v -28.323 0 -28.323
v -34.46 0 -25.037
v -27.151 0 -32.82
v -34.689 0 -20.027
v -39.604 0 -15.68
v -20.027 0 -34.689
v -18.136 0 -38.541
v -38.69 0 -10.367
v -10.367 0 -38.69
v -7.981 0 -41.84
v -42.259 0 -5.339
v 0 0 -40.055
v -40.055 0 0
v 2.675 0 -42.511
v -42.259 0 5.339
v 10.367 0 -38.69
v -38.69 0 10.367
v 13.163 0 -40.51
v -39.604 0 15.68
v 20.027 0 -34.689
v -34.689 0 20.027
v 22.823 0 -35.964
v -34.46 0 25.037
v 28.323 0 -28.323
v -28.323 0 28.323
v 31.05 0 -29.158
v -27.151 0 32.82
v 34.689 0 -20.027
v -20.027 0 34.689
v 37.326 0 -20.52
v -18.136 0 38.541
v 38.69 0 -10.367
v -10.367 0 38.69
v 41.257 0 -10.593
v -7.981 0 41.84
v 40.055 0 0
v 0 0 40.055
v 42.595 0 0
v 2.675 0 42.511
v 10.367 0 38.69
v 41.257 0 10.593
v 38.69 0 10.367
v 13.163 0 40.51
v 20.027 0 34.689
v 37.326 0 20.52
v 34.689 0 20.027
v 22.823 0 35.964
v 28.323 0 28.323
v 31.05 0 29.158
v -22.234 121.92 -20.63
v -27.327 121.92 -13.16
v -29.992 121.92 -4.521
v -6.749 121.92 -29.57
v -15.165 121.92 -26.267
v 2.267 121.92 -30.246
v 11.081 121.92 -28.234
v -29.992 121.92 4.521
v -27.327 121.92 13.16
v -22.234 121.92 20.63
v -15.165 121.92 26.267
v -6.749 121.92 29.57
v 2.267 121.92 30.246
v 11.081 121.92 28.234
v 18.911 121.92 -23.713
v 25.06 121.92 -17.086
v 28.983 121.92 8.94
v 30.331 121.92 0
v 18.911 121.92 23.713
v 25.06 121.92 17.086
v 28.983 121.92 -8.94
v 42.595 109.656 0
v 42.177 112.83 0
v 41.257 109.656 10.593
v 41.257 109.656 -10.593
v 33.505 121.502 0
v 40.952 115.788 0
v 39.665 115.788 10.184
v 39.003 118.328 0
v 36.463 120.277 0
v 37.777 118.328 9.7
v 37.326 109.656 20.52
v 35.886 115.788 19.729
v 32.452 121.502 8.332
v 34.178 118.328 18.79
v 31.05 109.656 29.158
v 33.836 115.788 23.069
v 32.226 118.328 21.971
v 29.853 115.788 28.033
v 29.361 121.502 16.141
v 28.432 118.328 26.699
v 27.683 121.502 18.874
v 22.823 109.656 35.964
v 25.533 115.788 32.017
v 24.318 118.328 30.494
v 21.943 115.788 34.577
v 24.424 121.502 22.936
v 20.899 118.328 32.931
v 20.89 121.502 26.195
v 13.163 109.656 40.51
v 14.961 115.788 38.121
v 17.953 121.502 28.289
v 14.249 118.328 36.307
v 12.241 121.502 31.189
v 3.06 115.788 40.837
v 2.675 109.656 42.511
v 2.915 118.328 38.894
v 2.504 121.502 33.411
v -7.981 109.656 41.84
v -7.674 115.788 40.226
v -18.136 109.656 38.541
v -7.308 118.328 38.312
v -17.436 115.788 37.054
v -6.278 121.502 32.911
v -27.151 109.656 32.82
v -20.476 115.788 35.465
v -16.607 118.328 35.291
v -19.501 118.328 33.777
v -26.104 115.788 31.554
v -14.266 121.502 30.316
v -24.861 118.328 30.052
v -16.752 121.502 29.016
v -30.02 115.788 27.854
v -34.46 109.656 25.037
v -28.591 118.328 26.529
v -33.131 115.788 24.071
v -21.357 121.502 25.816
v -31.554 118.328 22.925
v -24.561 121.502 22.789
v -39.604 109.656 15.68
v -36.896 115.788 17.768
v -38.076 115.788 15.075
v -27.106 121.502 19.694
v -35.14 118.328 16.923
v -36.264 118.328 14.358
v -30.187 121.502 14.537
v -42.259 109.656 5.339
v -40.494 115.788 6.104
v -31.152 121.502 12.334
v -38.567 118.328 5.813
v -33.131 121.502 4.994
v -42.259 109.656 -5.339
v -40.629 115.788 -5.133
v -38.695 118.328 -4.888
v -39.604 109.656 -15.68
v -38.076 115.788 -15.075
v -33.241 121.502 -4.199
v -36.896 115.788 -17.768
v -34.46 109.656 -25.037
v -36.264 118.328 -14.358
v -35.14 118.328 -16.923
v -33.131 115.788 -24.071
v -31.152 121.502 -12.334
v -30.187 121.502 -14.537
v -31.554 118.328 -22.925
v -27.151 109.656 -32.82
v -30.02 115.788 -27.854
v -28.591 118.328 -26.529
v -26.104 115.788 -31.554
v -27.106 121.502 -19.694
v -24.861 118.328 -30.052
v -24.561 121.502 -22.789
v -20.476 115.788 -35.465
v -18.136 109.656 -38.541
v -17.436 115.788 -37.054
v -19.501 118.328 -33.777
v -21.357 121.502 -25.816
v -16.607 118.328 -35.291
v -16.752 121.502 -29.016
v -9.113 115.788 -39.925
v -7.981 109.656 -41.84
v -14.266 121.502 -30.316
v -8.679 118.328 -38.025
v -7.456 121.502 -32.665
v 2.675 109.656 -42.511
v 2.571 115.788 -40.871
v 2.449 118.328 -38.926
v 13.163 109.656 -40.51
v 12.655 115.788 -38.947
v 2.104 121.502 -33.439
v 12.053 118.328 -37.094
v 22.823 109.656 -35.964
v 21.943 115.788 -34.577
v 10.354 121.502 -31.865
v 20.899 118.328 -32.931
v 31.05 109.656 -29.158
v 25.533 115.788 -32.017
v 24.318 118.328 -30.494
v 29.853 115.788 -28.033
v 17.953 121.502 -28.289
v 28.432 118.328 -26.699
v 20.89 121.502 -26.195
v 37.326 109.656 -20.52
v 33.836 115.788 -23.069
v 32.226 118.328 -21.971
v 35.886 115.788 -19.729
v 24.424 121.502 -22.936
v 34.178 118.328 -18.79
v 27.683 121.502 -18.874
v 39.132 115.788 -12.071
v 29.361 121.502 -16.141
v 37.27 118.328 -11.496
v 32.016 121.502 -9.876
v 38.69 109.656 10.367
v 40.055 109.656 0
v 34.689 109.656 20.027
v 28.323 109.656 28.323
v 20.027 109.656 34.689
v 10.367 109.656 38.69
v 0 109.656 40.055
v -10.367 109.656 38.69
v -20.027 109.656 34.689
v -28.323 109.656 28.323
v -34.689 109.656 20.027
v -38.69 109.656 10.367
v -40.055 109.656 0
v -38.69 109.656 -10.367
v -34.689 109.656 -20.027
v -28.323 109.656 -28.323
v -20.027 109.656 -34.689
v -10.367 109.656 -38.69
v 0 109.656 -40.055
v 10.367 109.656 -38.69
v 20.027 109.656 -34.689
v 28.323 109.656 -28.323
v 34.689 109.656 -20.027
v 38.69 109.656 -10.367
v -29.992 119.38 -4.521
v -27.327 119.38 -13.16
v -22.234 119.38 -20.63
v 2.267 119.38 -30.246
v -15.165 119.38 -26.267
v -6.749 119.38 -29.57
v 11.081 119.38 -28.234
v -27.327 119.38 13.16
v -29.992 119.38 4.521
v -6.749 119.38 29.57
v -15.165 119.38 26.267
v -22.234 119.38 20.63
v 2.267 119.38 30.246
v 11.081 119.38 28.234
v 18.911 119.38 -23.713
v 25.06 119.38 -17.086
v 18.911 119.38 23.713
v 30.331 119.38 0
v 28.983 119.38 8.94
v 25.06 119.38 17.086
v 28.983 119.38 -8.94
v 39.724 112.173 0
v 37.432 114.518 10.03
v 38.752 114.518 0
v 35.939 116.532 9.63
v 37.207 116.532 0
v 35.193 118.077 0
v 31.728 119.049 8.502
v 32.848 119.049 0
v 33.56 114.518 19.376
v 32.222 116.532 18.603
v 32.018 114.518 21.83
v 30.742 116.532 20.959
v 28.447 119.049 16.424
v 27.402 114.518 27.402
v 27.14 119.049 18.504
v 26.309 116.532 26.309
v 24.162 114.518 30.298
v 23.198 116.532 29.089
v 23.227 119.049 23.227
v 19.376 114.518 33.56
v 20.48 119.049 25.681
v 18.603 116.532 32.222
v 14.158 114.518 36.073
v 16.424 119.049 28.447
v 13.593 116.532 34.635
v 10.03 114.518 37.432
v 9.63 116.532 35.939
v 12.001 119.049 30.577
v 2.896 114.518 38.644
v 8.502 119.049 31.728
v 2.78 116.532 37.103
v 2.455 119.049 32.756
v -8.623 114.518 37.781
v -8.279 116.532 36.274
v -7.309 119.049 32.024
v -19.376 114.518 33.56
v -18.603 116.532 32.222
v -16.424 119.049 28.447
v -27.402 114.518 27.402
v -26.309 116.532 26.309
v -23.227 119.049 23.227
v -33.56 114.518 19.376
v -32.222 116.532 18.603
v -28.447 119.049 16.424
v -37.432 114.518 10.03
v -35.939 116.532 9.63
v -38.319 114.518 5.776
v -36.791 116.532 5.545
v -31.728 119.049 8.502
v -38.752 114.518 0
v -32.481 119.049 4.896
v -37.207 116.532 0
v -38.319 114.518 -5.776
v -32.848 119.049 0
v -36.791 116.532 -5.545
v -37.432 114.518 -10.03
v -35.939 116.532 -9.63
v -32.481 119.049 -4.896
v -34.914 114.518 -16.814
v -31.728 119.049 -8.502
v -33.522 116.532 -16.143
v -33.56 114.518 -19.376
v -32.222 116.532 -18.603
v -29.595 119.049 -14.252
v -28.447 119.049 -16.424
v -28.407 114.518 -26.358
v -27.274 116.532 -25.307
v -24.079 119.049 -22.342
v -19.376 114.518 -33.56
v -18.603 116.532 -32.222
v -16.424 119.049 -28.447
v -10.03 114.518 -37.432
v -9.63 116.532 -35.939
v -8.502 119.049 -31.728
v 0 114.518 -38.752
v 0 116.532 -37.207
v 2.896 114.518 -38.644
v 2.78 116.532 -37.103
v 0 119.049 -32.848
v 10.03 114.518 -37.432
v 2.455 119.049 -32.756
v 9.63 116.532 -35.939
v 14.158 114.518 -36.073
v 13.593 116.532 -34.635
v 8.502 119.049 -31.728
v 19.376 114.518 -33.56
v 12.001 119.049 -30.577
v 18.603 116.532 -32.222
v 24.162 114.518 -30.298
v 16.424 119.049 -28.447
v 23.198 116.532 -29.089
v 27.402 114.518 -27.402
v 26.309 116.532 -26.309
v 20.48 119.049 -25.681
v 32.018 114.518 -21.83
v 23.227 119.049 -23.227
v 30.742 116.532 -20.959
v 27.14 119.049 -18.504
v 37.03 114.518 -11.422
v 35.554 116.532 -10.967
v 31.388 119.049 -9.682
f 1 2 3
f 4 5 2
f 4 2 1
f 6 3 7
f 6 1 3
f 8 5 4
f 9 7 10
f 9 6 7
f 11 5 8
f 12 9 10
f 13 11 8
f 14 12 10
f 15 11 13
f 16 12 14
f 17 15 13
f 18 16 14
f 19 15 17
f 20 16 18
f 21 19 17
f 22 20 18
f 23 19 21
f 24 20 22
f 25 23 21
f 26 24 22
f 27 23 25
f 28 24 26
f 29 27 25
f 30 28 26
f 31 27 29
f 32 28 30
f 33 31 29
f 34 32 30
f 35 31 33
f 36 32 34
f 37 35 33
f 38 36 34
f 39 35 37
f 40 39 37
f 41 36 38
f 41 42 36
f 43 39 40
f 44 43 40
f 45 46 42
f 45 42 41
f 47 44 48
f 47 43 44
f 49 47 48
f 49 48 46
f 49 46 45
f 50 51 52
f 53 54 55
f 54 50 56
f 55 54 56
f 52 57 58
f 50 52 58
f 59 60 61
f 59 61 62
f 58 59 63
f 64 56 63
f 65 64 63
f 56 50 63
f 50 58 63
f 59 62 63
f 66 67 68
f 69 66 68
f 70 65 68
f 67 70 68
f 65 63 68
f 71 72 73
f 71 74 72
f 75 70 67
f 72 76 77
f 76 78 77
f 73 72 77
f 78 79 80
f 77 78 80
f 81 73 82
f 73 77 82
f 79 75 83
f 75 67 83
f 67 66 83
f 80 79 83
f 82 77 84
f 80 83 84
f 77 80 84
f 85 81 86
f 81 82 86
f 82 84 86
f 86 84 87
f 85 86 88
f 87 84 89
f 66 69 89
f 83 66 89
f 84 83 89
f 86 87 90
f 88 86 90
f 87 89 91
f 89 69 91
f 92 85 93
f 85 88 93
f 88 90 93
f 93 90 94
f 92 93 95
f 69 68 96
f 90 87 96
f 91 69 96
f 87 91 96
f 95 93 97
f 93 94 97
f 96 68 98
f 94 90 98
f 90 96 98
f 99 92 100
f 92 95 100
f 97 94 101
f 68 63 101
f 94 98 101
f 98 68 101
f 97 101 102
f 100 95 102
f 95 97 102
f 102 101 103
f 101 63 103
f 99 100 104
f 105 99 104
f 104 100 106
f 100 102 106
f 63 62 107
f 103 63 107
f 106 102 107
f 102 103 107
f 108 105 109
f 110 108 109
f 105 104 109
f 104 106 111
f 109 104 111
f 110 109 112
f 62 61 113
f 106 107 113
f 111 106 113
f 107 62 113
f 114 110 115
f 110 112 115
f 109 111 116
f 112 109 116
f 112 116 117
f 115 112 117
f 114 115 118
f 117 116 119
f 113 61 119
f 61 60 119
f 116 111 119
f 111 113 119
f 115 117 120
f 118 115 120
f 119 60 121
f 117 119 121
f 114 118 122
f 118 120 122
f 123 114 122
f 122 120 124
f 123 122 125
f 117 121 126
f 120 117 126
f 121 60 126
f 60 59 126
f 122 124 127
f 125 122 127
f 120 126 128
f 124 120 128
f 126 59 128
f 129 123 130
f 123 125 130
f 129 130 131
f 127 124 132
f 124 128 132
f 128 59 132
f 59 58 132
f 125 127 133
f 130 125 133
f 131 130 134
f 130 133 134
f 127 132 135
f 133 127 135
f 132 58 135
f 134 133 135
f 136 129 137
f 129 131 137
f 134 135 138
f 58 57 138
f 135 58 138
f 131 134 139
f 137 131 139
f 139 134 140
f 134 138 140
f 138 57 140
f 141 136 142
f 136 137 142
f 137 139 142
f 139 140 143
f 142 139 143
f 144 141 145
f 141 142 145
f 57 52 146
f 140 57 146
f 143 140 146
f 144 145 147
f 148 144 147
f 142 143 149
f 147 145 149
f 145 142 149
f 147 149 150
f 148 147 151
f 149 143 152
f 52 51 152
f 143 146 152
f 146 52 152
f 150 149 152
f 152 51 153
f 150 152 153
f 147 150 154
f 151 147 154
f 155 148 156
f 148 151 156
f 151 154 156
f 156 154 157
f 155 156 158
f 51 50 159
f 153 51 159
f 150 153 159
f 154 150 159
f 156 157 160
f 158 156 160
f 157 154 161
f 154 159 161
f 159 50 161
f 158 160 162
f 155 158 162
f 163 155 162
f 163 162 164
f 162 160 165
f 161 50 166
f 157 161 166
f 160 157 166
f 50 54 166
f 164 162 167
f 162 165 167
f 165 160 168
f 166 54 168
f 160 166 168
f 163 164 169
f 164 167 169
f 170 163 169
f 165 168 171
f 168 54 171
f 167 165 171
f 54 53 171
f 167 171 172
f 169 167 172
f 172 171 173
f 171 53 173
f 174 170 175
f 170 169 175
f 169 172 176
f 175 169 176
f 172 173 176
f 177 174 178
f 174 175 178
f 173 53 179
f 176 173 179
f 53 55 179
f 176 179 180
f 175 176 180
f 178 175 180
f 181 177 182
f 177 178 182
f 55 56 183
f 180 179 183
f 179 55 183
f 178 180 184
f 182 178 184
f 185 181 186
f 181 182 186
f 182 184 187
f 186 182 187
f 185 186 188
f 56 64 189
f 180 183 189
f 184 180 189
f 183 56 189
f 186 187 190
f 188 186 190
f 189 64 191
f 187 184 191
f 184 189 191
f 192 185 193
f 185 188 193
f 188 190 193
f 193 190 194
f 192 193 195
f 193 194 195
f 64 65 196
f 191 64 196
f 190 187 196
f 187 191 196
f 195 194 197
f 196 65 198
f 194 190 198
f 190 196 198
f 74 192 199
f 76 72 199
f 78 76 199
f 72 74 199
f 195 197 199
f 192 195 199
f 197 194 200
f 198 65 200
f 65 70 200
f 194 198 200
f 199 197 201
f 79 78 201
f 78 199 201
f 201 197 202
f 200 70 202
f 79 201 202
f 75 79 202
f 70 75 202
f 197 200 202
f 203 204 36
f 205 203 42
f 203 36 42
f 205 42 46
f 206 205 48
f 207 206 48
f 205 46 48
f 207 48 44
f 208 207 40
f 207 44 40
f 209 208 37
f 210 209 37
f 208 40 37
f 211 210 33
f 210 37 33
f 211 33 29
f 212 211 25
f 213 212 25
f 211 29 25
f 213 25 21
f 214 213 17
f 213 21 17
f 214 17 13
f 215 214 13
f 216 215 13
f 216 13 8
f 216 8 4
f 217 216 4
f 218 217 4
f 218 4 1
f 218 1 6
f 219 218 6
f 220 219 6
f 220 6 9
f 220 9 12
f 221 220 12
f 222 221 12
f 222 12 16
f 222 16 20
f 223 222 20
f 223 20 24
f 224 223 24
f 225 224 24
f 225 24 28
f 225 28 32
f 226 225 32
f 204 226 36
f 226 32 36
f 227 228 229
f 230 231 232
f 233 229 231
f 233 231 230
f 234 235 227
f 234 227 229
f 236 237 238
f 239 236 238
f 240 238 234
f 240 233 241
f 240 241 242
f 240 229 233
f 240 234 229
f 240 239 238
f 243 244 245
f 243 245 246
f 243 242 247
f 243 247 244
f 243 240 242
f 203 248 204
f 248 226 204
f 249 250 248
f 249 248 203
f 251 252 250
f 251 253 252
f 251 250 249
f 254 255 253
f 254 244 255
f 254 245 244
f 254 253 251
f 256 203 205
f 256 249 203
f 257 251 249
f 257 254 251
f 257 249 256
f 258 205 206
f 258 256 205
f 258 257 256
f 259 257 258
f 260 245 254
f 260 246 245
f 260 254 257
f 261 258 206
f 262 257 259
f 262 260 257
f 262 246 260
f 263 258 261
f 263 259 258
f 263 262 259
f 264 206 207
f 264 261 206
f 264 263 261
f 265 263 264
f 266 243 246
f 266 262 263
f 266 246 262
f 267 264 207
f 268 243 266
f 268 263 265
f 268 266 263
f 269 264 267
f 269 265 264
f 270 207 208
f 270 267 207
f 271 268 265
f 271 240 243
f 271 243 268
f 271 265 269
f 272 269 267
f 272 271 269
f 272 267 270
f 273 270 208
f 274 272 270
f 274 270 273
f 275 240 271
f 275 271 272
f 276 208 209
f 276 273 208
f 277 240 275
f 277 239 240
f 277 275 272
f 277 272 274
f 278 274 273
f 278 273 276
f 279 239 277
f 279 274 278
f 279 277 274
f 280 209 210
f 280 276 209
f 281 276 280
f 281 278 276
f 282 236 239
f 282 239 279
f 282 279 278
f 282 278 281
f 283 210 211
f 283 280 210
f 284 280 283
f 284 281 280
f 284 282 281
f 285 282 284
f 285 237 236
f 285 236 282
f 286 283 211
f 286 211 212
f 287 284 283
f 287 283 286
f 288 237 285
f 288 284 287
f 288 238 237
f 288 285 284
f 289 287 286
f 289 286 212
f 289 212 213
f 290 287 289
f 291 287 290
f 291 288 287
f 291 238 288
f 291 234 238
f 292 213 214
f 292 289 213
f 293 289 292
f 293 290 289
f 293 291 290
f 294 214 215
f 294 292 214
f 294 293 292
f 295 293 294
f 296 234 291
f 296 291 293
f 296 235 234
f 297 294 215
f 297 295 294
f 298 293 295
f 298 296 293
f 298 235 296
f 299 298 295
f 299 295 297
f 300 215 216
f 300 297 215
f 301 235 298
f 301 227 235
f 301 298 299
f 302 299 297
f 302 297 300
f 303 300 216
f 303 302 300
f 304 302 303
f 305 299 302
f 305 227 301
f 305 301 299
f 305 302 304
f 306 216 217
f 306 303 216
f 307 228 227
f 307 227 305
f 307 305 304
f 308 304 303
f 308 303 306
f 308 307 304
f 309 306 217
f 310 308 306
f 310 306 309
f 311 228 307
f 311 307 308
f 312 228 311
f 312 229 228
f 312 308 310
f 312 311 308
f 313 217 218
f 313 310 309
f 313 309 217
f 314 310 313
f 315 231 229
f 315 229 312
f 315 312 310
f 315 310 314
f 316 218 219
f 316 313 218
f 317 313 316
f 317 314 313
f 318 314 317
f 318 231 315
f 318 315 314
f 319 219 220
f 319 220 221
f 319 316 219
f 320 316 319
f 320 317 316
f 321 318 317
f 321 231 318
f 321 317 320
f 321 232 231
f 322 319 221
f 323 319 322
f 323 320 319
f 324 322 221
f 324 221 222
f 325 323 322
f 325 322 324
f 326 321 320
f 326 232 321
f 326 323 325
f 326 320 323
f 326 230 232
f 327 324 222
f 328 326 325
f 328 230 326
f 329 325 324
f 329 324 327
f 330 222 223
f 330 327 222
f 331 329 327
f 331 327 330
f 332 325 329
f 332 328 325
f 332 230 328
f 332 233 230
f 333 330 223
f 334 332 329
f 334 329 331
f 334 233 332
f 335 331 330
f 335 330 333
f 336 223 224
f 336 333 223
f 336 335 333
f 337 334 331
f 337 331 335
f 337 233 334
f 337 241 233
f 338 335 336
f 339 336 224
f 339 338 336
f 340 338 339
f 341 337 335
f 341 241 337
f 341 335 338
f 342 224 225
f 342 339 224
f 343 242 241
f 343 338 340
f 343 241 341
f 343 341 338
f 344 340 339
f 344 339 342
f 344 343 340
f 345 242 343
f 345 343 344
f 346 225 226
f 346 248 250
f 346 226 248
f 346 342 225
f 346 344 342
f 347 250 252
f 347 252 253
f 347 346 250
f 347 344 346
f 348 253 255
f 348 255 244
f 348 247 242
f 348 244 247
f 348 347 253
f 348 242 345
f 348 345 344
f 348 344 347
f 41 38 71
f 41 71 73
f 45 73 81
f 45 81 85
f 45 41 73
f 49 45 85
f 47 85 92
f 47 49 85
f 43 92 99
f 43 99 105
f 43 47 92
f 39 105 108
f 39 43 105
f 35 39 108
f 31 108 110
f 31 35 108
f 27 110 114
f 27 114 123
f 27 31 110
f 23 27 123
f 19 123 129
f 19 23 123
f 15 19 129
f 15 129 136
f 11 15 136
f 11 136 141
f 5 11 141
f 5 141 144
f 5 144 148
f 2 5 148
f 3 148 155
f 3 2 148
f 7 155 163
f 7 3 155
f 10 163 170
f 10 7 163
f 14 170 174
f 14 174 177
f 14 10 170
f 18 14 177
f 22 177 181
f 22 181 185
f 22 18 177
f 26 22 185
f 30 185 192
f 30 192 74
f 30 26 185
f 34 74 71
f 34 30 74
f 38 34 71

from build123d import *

# Parameters (mm, degrees)
F0_R     = 42.594898
F1_DEPTH = 121.92
F2_R     = 12.264205
F3_T     = -2.54


with BuildPart() as f1:
    # F0 (on Front) → F1 (new body)
    with BuildSketch(Plane.XZ):
        Circle(F0_R)
    extrude(amount=-F1_DEPTH)

    # F2
    f2_edges = [f1.edges().sort_by_distance(p)[0] for p in [
        (-42.594898, 121.92, 0),
    ]]
    fillet(f2_edges, radius=F2_R)

    # F3
    f3_openings = [f1.faces().sort_by_distance(p)[0] for p in [
        (0, 0, 0),
    ]]
    offset(amount=F3_T, openings=f3_openings)


solid = f1.part
